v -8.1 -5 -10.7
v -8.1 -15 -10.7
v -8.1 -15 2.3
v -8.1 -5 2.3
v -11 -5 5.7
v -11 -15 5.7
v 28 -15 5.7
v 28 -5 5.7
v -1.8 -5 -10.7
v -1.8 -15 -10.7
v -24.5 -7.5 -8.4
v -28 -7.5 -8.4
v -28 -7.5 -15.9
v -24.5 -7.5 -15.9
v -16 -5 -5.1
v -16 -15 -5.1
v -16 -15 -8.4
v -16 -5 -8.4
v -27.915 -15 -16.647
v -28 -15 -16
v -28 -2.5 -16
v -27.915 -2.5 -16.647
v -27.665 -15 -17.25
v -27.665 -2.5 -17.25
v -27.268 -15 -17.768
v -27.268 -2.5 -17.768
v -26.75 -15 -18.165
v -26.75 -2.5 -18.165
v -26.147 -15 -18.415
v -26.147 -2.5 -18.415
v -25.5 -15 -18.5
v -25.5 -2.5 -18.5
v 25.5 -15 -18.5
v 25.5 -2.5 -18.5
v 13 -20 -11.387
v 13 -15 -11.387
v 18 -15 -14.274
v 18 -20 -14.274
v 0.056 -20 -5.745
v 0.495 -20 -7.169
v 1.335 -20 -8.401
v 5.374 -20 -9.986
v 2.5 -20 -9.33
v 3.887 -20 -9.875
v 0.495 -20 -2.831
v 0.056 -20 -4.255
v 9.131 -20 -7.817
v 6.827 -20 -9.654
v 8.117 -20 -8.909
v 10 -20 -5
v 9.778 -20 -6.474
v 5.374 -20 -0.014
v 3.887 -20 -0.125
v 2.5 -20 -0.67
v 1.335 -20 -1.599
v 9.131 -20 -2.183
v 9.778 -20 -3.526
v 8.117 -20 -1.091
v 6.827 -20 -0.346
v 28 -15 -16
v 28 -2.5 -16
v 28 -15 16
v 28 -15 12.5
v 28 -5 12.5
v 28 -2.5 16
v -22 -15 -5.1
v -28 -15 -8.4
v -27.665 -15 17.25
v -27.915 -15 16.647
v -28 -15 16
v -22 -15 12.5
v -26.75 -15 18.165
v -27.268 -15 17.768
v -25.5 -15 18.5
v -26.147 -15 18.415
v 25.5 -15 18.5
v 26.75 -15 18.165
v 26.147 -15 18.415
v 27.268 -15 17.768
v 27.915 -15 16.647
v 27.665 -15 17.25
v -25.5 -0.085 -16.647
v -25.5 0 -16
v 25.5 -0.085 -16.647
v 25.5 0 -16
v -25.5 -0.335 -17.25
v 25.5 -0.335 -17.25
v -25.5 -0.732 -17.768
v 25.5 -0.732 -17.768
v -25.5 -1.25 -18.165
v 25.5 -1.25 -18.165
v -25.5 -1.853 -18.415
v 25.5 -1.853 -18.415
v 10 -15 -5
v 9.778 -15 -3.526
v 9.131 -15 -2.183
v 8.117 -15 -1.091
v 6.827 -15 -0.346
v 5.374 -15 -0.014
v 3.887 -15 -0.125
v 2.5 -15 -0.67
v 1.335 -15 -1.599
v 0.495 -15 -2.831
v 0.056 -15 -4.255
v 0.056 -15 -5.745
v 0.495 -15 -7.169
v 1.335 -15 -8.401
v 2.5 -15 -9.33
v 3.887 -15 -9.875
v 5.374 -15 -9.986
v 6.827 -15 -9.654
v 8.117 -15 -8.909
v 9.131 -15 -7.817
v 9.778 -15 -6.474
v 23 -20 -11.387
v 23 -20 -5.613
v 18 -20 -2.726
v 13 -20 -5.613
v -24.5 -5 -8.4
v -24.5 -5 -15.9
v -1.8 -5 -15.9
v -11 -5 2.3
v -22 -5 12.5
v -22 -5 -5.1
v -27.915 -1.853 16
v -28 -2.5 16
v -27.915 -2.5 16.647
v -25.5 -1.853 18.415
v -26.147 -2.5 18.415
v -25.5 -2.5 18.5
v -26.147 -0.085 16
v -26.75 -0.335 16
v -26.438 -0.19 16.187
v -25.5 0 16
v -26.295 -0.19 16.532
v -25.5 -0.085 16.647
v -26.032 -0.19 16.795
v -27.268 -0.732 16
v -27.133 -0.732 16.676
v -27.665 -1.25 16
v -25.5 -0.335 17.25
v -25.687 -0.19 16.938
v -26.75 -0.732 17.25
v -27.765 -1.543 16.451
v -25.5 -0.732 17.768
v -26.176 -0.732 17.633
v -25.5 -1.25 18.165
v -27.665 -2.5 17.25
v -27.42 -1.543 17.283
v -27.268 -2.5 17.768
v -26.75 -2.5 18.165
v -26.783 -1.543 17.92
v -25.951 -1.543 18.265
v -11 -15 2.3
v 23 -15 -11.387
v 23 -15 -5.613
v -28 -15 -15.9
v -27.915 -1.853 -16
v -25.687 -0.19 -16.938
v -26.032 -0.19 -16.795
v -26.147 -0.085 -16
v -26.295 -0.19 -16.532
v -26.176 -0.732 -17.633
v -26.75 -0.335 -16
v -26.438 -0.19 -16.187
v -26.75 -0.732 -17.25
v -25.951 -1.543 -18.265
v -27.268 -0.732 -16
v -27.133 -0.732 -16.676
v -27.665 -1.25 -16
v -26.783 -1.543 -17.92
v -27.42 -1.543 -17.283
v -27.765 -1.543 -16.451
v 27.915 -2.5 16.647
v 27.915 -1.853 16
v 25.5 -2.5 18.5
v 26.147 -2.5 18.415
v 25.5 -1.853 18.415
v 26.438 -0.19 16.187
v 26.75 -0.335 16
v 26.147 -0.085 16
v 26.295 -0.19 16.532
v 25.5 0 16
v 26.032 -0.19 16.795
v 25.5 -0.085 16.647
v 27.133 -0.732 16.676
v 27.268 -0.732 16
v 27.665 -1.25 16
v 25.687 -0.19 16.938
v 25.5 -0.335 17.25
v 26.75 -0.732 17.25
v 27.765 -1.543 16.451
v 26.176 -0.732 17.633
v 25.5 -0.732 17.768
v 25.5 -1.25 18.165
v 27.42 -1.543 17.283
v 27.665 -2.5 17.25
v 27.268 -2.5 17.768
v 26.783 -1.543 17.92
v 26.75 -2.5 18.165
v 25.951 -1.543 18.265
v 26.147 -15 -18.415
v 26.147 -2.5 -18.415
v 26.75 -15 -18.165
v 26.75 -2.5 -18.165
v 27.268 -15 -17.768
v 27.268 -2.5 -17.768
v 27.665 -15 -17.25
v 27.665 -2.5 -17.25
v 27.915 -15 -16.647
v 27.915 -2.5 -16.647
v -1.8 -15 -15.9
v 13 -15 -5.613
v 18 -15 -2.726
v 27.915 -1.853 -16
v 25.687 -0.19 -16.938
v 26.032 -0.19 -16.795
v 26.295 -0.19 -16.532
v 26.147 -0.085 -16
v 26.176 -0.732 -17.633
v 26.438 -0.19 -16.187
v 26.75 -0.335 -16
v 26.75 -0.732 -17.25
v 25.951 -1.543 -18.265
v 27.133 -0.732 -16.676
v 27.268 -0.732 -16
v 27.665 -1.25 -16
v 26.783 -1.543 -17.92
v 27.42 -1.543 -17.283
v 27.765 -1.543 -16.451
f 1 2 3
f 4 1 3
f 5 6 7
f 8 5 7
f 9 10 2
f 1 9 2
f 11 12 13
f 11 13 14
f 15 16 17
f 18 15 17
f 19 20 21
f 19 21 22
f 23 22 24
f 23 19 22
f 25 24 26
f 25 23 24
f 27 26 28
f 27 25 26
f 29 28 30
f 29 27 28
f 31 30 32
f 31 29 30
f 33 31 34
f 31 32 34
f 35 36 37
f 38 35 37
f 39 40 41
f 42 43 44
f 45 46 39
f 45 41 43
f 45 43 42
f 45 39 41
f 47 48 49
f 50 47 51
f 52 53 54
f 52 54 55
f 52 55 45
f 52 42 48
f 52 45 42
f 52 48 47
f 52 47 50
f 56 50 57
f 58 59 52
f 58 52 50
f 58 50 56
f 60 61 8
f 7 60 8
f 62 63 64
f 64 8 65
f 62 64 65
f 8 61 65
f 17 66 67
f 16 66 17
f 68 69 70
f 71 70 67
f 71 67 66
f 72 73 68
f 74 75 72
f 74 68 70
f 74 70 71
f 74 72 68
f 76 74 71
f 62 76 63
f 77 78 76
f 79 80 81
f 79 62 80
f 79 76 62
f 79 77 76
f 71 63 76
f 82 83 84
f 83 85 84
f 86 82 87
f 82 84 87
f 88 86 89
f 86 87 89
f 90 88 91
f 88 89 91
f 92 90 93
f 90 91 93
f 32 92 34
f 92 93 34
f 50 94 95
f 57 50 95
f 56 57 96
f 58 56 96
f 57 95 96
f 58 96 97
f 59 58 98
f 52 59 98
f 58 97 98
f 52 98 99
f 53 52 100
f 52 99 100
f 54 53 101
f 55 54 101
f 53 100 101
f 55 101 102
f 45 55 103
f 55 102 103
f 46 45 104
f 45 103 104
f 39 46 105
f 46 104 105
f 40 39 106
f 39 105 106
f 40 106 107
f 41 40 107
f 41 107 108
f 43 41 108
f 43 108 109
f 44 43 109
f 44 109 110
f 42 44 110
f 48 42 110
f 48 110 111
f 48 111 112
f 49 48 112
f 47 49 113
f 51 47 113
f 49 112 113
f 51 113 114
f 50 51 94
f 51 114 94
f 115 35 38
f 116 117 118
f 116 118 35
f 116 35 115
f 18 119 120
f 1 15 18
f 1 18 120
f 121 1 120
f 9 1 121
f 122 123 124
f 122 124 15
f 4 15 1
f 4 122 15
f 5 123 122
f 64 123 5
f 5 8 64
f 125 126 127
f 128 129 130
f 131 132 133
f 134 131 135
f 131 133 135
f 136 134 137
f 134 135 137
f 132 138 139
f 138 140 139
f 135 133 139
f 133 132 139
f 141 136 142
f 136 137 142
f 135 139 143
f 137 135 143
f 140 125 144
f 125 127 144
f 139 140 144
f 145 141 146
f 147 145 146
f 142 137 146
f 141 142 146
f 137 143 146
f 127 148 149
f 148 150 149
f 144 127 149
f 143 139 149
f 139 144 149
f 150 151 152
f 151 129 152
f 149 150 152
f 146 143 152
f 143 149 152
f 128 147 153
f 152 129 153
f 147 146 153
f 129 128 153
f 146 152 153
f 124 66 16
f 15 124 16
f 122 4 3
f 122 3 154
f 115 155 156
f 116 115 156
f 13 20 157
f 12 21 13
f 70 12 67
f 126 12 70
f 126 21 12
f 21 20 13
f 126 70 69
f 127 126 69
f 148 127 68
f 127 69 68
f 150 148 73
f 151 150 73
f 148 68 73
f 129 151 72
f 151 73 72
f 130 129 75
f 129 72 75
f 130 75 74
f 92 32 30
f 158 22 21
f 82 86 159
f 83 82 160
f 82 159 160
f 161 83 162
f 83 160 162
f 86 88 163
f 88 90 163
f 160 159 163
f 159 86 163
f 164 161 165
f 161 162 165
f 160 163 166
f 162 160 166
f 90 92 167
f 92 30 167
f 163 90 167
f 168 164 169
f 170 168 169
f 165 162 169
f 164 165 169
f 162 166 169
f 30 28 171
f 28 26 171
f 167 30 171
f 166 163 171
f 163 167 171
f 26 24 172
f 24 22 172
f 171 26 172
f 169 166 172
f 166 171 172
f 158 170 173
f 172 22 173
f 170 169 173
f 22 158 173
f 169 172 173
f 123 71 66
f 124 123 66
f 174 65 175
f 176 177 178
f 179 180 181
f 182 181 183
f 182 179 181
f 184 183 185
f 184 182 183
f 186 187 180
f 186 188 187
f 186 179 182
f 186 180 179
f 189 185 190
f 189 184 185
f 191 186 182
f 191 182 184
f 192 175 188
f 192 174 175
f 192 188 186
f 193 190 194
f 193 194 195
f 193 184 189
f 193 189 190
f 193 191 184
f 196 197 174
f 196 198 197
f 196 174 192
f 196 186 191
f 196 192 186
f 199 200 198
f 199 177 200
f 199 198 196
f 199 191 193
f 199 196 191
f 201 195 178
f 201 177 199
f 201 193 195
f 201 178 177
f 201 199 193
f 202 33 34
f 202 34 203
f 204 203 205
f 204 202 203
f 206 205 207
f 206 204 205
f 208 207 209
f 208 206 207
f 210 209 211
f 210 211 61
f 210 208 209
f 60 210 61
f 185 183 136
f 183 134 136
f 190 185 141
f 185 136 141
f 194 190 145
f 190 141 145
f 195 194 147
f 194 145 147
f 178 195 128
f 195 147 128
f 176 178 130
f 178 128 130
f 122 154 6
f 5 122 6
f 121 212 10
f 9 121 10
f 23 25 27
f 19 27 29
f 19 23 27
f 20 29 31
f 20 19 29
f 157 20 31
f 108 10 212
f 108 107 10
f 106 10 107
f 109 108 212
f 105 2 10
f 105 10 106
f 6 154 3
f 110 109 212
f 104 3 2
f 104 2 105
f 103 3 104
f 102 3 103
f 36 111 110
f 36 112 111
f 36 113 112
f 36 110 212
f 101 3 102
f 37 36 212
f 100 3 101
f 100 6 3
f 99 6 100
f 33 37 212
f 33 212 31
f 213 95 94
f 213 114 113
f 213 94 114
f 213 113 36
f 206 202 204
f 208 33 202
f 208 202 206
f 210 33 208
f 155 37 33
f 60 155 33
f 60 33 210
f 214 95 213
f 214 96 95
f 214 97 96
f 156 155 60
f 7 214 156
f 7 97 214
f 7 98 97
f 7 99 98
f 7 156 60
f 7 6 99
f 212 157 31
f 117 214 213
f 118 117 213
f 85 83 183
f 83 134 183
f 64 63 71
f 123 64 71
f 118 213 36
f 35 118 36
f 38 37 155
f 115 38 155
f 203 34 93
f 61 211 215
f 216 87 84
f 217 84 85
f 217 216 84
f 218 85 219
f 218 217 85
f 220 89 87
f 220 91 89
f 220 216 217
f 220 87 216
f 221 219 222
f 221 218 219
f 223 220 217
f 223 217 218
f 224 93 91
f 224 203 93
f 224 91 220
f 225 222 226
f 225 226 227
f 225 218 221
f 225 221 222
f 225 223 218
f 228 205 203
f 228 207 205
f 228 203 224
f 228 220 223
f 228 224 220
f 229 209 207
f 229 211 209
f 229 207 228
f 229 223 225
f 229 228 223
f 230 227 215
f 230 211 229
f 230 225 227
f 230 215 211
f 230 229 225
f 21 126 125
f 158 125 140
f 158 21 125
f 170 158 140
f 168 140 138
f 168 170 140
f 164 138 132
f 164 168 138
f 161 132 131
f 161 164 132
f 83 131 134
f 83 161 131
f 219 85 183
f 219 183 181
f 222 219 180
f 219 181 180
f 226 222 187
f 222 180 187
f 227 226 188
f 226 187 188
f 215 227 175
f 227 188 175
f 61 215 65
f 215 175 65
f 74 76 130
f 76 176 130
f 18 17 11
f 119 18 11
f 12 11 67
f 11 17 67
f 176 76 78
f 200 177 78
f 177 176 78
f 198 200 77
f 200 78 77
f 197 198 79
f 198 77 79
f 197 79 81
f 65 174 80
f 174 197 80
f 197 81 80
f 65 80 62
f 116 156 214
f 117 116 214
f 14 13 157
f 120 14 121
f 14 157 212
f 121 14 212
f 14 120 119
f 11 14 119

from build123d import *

# Parameters (mm, degrees)
F1_DEPTH  = 15
F3_DEPTH  = 10
F5_DEPTH  = 5
F6_W      = 3.5
F6_H      = 7.5
F7_DEPTH  = 2.5
F8_R      = 2.5
F9_R      = 5
F10_DEPTH = 5


with BuildPart() as f1:
    # F0 (on Front) → F1 (new body)
    with BuildSketch(Plane.XZ):
        Polygon((24.5, 18.5), (-24.5, 18.5), (-28, 18.5), (-28, -18.5), (-24.5, -18.5), (24.5, -18.5), (28, -18.5), (28, 18.5), align=None)
    extrude(amount=F1_DEPTH)

    # F2 (on face) → F3 (cut)
    with BuildSketch(Plane.XZ.offset(15)):
        Polygon((28, 12.5), (24.5, 12.5), (-22, 12.5), (-22, -5.1), (-16, -5.1), (-16, -8.4), (-24.5, -8.4), (-28, -8.4), (-28, -15.9), (-24.5, -15.9), (-1.8, -15.9), (-1.8, -10.7), (-8.1, -10.7), (-8.1, 2.3), (-11, 2.3), (-11, 5.7), (24.5, 5.7), (28, 5.7), align=None)
    extrude(amount=-F3_DEPTH, mode=Mode.SUBTRACT)

    # F4 (on face) → F5 (join)
    with BuildSketch(Plane.XZ.offset(15)):
        Polygon((23, -11.386751), (23, -5.613249), (18, -2.726497), (13, -5.613249), (13, -11.386751), (18, -14.273503), align=None)
    extrude(amount=F5_DEPTH)

    # F6 (on face) → F7 (join)
    with BuildSketch(Plane.XZ.offset(5)):
        with Locations((-26.25, -12.15)):
            Rectangle(F6_W, F6_H)
    extrude(amount=F7_DEPTH)

    # F8
    f8_edges = [f1.edges().sort_by_distance(p)[0] for p in [
        (-28, -7.5, 18.5),
        (28, -7.5, 18.5),
        (28, -7.5, -18.5),
        (-28, -7.5, -18.5),
        (0, 0, -18.5),
        (-28, 0, 0),
        (28, 0, 0),
        (0, 0, 18.5),
    ]]
    fillet(f8_edges, radius=F8_R)

    # F9 (on face) → F10 (join)
    with BuildSketch(Plane.XZ.offset(15)):
        with Locations((5, -5)):
            Circle(F9_R)
    extrude(amount=F10_DEPTH)


solid = f1.part
